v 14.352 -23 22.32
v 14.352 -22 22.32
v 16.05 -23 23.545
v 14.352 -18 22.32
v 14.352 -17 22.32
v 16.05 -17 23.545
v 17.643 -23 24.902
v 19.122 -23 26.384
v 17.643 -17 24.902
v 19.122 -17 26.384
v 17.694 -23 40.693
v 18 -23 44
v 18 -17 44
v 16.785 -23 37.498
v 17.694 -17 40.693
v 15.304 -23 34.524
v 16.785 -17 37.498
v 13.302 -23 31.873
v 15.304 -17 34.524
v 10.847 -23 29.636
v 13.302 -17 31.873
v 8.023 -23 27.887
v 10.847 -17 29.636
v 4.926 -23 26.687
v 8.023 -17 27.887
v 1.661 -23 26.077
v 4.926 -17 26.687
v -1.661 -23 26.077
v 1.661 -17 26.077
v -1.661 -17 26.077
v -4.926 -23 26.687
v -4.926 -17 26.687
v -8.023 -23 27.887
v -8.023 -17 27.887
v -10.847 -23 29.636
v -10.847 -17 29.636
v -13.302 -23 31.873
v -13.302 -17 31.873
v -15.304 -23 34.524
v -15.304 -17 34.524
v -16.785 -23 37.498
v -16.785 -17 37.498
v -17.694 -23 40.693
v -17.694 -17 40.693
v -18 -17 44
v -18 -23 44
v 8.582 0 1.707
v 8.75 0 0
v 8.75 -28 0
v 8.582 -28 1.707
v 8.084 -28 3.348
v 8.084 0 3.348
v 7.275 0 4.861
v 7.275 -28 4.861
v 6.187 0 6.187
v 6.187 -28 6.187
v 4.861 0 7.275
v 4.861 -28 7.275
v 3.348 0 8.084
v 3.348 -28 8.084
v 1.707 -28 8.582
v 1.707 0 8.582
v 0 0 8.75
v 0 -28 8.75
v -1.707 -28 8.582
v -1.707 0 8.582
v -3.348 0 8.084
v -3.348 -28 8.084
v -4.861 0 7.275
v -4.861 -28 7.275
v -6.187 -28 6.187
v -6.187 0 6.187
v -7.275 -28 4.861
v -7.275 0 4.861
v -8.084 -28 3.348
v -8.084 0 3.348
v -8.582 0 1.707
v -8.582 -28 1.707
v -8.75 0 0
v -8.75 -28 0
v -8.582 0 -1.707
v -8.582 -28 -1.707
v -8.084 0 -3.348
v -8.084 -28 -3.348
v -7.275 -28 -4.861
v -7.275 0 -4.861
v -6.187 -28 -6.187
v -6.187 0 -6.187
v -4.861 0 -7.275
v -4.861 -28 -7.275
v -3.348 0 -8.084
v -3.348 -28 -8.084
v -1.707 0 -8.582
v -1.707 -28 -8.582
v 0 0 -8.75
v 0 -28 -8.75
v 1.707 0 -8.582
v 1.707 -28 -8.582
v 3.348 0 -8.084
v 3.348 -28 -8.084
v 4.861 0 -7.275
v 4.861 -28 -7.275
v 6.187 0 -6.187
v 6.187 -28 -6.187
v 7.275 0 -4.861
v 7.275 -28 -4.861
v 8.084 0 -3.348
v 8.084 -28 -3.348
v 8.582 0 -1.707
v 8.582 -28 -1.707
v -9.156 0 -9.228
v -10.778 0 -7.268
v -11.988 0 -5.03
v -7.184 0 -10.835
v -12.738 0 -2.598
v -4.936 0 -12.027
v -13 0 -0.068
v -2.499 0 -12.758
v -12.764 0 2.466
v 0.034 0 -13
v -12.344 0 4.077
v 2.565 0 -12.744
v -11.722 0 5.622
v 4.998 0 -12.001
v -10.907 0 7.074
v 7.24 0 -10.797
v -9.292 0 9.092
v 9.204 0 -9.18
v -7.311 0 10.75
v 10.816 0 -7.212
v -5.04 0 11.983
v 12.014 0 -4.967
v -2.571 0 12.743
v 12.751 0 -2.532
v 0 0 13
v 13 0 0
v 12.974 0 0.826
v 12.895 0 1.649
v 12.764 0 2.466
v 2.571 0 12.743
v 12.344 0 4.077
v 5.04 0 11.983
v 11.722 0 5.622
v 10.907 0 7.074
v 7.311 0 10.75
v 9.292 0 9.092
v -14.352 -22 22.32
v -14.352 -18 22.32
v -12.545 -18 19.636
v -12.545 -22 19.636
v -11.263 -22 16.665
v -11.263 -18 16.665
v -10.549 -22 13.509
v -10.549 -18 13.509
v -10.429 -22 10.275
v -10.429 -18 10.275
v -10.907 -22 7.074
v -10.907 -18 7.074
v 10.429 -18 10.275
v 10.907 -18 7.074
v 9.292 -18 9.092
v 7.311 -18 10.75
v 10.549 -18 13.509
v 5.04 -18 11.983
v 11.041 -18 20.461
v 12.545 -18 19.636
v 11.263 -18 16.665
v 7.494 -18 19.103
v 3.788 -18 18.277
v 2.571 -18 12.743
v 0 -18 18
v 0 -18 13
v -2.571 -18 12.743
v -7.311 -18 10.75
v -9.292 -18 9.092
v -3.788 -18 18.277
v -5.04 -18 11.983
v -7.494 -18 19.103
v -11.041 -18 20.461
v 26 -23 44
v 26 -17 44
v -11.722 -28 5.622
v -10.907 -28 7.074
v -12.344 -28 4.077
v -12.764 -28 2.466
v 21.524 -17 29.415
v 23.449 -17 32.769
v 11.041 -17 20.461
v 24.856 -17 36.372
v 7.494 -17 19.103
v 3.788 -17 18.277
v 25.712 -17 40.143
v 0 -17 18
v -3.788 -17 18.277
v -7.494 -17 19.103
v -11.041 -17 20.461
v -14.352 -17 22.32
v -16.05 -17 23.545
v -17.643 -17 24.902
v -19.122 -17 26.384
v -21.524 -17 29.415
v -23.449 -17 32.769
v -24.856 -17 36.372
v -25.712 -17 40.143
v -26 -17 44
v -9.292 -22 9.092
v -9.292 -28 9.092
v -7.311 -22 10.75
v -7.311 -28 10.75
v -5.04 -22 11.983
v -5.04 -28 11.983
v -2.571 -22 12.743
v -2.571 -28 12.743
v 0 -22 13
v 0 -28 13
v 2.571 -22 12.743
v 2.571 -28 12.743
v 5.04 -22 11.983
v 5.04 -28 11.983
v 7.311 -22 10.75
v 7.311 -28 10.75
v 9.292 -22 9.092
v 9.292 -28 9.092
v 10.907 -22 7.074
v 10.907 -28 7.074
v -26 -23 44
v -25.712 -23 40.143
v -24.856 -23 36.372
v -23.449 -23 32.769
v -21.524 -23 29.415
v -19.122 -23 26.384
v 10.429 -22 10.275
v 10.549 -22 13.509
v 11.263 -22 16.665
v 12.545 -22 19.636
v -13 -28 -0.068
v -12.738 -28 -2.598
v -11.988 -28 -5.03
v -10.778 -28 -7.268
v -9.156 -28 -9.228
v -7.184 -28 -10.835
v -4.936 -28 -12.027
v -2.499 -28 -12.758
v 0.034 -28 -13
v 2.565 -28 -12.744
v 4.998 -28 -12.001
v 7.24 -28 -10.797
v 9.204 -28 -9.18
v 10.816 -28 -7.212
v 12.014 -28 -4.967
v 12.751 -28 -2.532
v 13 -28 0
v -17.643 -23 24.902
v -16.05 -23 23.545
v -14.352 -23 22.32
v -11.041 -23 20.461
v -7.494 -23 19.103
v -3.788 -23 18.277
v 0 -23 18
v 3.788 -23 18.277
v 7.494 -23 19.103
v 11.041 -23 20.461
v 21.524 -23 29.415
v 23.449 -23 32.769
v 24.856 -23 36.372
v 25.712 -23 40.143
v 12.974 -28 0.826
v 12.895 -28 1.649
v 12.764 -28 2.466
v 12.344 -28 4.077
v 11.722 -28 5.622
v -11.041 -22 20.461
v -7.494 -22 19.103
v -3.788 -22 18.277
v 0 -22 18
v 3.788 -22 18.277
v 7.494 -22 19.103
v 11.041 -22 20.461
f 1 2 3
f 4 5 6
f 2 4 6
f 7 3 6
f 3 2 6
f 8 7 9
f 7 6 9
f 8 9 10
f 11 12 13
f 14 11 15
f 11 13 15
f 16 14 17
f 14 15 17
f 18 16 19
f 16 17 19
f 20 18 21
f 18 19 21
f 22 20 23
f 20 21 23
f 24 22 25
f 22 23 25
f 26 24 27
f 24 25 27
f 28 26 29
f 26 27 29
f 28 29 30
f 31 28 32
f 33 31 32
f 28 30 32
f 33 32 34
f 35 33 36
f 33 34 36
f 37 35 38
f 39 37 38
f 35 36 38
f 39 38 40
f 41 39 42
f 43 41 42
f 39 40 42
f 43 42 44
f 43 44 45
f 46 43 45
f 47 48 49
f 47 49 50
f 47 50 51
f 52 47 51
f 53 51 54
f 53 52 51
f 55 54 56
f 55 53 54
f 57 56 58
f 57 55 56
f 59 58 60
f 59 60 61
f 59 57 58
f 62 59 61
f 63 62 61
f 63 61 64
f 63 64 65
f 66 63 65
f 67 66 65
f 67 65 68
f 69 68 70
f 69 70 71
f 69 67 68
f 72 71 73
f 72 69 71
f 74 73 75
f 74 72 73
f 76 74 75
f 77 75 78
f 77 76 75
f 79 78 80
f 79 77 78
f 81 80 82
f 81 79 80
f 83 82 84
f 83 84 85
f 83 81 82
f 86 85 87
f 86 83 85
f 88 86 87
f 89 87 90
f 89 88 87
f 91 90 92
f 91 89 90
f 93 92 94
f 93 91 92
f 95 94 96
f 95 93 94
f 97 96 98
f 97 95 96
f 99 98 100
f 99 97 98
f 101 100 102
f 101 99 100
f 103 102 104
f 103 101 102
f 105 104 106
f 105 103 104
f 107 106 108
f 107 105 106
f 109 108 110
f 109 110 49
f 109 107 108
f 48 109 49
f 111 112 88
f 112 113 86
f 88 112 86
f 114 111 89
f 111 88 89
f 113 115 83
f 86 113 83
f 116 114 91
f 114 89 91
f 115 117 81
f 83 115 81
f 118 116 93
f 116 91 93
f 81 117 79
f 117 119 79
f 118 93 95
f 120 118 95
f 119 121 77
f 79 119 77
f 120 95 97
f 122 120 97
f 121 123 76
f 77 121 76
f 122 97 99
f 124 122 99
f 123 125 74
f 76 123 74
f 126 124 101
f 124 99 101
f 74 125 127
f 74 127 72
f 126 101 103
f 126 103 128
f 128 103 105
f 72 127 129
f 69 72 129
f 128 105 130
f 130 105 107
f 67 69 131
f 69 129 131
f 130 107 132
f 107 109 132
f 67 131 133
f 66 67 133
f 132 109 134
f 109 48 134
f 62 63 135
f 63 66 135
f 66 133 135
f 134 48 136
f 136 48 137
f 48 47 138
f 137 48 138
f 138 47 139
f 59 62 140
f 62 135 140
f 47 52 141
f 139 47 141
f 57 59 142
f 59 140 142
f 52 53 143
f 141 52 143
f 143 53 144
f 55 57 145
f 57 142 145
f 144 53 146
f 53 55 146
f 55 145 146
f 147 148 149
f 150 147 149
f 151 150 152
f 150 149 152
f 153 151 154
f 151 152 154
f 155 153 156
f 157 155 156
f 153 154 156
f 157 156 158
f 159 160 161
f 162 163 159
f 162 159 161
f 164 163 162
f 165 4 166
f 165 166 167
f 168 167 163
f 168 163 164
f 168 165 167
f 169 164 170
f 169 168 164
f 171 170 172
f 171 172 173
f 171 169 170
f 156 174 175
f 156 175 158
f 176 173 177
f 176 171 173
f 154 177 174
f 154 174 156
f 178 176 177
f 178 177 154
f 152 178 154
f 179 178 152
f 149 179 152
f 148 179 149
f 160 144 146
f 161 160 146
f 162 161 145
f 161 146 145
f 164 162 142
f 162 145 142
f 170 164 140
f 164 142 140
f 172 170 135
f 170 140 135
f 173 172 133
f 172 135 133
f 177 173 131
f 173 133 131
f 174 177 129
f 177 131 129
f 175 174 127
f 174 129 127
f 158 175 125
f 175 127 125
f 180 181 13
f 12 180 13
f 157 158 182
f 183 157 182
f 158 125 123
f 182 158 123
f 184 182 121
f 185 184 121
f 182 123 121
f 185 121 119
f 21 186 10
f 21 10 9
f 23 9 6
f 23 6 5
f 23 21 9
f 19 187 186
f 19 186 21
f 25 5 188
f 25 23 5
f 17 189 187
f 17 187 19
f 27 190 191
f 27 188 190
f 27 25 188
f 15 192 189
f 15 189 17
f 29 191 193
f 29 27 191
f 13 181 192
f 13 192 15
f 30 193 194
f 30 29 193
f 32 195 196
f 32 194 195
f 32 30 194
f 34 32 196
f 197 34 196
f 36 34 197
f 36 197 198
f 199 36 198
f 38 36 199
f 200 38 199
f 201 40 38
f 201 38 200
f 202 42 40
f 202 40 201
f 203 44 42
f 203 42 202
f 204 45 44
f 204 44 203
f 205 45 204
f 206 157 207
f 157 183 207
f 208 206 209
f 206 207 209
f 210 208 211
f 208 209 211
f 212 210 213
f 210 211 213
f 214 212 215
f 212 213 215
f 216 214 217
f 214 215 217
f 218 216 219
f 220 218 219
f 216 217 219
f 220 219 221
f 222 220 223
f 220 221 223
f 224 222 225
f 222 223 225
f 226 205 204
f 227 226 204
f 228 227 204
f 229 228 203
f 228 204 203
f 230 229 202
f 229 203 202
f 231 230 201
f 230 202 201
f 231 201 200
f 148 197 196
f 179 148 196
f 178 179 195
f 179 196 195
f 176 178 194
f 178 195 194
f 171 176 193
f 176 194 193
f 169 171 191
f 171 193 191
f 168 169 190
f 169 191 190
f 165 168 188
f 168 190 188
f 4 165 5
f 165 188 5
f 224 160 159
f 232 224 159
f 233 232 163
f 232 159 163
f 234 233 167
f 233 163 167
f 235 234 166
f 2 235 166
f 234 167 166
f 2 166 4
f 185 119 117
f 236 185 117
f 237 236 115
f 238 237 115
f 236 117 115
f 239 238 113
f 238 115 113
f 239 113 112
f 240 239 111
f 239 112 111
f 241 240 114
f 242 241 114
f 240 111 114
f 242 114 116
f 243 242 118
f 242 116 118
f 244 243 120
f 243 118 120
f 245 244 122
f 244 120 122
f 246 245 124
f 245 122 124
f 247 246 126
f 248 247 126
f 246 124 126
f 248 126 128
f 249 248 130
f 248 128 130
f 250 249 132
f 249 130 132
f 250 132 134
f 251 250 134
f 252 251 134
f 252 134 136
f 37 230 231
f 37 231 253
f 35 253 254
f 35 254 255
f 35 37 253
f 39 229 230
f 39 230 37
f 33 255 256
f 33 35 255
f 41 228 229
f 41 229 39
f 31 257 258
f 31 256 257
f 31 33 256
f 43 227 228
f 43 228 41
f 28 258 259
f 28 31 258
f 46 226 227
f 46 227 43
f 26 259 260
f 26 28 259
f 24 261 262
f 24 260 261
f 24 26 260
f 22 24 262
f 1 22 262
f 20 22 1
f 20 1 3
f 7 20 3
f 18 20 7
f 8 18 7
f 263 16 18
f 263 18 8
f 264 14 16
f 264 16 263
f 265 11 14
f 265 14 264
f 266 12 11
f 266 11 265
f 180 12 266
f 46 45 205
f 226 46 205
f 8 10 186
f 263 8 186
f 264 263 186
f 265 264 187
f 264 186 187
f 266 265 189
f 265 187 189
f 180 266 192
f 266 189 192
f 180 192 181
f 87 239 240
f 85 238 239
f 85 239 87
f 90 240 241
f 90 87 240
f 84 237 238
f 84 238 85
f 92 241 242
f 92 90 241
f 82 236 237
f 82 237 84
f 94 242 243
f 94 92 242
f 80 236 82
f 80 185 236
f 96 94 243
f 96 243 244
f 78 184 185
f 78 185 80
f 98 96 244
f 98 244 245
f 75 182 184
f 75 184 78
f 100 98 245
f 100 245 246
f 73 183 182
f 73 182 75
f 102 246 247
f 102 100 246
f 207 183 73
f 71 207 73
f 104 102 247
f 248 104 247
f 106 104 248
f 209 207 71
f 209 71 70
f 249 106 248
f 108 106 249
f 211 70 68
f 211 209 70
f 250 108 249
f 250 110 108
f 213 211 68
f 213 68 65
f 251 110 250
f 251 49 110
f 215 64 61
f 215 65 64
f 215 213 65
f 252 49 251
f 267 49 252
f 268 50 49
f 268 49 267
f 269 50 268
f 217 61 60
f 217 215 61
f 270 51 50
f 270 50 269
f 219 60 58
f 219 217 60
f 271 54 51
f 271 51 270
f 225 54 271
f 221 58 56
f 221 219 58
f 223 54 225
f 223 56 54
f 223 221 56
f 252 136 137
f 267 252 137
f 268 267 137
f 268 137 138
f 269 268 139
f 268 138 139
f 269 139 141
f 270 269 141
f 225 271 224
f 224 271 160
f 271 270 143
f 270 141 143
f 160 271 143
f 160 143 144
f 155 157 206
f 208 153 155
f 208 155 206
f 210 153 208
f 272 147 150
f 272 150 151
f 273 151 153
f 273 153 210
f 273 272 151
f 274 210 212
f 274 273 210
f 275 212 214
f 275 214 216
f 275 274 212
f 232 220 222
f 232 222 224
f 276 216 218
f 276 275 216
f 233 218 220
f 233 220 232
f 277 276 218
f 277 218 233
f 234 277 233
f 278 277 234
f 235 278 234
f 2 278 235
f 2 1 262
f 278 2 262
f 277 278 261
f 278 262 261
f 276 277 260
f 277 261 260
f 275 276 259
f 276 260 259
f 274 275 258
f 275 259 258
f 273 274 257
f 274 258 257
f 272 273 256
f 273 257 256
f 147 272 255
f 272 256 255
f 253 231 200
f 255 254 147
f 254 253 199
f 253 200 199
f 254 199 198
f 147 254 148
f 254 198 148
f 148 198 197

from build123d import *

# Parameters (mm, degrees)
F0_R     = 8.75
F1_DEPTH = 28
F3_DEPTH = 5
F5_DEPTH = 17
F7_DEPTH = 1
F9_DEPTH = 1


with BuildPart() as f1:
    # F0 (on Front) → F1 (new body)
    with BuildSketch(Plane.XZ):
        with BuildLine():
            ThreePointArc((-12.76405, 2.465566), (-1.238415, -12.940878), (13, 0))
            ThreePointArc((13, 0), (12.940878, 1.238415), (12.76405, 2.465566))
            ThreePointArc((12.76405, 2.465566), (11.670877, 4.703728), (10.906538, 7.07442))
            ThreePointArc((10.906538, 7.07442), (0, 13), (-10.906538, 7.07442))
            ThreePointArc((-10.906538, 7.07442), (-11.670877, 4.703728), (-12.76405, 2.465566))
        make_face()
        Circle(F0_R, mode=Mode.SUBTRACT)
        with BuildLine():
            ThreePointArc((10.906538, 7.07442), (11.670877, 4.703728), (12.76405, 2.465566))
            ThreePointArc((12.76405, 2.465566), (12.057553, 4.85957), (10.906538, 7.07442))
        make_face()
        with BuildLine():
            ThreePointArc((-10.906538, 7.07442), (-12.057553, 4.85957), (-12.76405, 2.465566))
            ThreePointArc((-12.76405, 2.465566), (-11.670877, 4.703728), (-10.906538, 7.07442))
        make_face()
        with BuildLine():
            ThreePointArc((-10.906538, 7.07442), (0, 13), (10.906538, 7.07442))
            ThreePointArc((10.906538, 7.07442), (10.832753, 15.103442), (14.352365, 22.320295))
            ThreePointArc((14.352365, 22.320295), (0, 18), (-14.352365, 22.320295))
            ThreePointArc((-14.352365, 22.320295), (-10.832753, 15.103442), (-10.906538, 7.07442))
        make_face()
        with BuildLine():
            ThreePointArc((-14.352365, 22.320295), (0, 18), (14.352365, 22.320295))
            ThreePointArc((14.352365, 22.320295), (16.553993, 24.567178), (19.122307, 26.383605))
            ThreePointArc((19.122307, 26.383605), (24.21962, 34.544313), (26, 44))
            Line((26, 44), (18, 44))
            ThreePointArc((18, 44), (0, 26), (-18, 44))
            Line((-18, 44), (-26, 44))
            ThreePointArc((-26, 44), (-24.21962, 34.544313), (-19.122307, 26.383605))
            ThreePointArc((-19.122307, 26.383605), (-16.553993, 24.567178), (-14.352365, 22.320295))
        make_face()
        with BuildLine():
            ThreePointArc((19.122307, 26.383605), (16.553993, 24.567178), (14.352365, 22.320295))
            ThreePointArc((14.352365, 22.320295), (16.860191, 24.20773), (19.122307, 26.383605))
        make_face()
        with BuildLine():
            ThreePointArc((-19.122307, 26.383605), (-16.860191, 24.20773), (-14.352365, 22.320295))
            ThreePointArc((-14.352365, 22.320295), (-16.553993, 24.567178), (-19.122307, 26.383605))
        make_face()
    extrude(amount=F1_DEPTH)

    # F2 (on face) → F3 (cut)
    with BuildSketch(Plane.XZ.offset(28)):
        with BuildLine():
            Line((-18, 44), (-26, 44))
            ThreePointArc((-26, 44), (-22.903728, 31.694747), (-14.352365, 22.320295))
            ThreePointArc((-14.352365, 22.320295), (-10.832753, 15.103442), (-10.906538, 7.07442))
            ThreePointArc((-10.906538, 7.07442), (0, 13), (10.906538, 7.07442))
            ThreePointArc((10.906538, 7.07442), (10.832753, 15.103442), (14.352365, 22.320295))
            ThreePointArc((14.352365, 22.320295), (22.903728, 31.694747), (26, 44))
            Line((26, 44), (18, 44))
            ThreePointArc((18, 44), (0, 26), (-18, 44))
        make_face()
    extrude(amount=-F3_DEPTH, mode=Mode.SUBTRACT)

    # F4 (on face) → F5 (cut)
    with BuildSketch(Plane(origin=(0, 0, 0), x_dir=(-1, 0, 0), z_dir=(0, 1, 0))):
        with BuildLine():
            Line((-18, 44), (-26, 44))
            ThreePointArc((-26, 44), (-22.903728, 31.694747), (-14.352365, 22.320295))
            ThreePointArc((-14.352365, 22.320295), (-10.832753, 15.103442), (-10.906538, 7.07442))
            ThreePointArc((-10.906538, 7.07442), (0, 13), (10.906538, 7.07442))
            ThreePointArc((10.906538, 7.07442), (10.832753, 15.103442), (14.352365, 22.320295))
            ThreePointArc((14.352365, 22.320295), (22.903728, 31.694747), (26, 44))
            Line((26, 44), (18, 44))
            ThreePointArc((18, 44), (0, 26), (-18, 44))
        make_face()
    extrude(amount=-F5_DEPTH, mode=Mode.SUBTRACT)

    # F6 (on face) → F7 (cut)
    with BuildSketch(Plane(origin=(0, -17, 0), x_dir=(-1, 0, 0), z_dir=(0, 1, 0))):
        with BuildLine():
            ThreePointArc((14.352365, 22.320295), (0, 18), (-14.352365, 22.320295))
            ThreePointArc((-14.352365, 22.320295), (-10.832753, 15.103442), (-10.906538, 7.07442))
            ThreePointArc((-10.906538, 7.07442), (0, 13), (10.906538, 7.07442))
            ThreePointArc((10.906538, 7.07442), (10.832753, 15.103442), (14.352365, 22.320295))
        make_face()
    extrude(amount=-F7_DEPTH, mode=Mode.SUBTRACT)

    # F8 (on face) → F9 (cut)
    with BuildSketch(Plane.XZ.offset(23)):
        with BuildLine():
            ThreePointArc((14.352365, 22.320295), (0, 18), (-14.352365, 22.320295))
            ThreePointArc((-14.352365, 22.320295), (-10.832753, 15.103442), (-10.906538, 7.07442))
            ThreePointArc((-10.906538, 7.07442), (0, 13), (10.906538, 7.07442))
            ThreePointArc((10.906538, 7.07442), (10.832753, 15.103442), (14.352365, 22.320295))
        make_face()
    extrude(amount=-F9_DEPTH, mode=Mode.SUBTRACT)


solid = f1.part
